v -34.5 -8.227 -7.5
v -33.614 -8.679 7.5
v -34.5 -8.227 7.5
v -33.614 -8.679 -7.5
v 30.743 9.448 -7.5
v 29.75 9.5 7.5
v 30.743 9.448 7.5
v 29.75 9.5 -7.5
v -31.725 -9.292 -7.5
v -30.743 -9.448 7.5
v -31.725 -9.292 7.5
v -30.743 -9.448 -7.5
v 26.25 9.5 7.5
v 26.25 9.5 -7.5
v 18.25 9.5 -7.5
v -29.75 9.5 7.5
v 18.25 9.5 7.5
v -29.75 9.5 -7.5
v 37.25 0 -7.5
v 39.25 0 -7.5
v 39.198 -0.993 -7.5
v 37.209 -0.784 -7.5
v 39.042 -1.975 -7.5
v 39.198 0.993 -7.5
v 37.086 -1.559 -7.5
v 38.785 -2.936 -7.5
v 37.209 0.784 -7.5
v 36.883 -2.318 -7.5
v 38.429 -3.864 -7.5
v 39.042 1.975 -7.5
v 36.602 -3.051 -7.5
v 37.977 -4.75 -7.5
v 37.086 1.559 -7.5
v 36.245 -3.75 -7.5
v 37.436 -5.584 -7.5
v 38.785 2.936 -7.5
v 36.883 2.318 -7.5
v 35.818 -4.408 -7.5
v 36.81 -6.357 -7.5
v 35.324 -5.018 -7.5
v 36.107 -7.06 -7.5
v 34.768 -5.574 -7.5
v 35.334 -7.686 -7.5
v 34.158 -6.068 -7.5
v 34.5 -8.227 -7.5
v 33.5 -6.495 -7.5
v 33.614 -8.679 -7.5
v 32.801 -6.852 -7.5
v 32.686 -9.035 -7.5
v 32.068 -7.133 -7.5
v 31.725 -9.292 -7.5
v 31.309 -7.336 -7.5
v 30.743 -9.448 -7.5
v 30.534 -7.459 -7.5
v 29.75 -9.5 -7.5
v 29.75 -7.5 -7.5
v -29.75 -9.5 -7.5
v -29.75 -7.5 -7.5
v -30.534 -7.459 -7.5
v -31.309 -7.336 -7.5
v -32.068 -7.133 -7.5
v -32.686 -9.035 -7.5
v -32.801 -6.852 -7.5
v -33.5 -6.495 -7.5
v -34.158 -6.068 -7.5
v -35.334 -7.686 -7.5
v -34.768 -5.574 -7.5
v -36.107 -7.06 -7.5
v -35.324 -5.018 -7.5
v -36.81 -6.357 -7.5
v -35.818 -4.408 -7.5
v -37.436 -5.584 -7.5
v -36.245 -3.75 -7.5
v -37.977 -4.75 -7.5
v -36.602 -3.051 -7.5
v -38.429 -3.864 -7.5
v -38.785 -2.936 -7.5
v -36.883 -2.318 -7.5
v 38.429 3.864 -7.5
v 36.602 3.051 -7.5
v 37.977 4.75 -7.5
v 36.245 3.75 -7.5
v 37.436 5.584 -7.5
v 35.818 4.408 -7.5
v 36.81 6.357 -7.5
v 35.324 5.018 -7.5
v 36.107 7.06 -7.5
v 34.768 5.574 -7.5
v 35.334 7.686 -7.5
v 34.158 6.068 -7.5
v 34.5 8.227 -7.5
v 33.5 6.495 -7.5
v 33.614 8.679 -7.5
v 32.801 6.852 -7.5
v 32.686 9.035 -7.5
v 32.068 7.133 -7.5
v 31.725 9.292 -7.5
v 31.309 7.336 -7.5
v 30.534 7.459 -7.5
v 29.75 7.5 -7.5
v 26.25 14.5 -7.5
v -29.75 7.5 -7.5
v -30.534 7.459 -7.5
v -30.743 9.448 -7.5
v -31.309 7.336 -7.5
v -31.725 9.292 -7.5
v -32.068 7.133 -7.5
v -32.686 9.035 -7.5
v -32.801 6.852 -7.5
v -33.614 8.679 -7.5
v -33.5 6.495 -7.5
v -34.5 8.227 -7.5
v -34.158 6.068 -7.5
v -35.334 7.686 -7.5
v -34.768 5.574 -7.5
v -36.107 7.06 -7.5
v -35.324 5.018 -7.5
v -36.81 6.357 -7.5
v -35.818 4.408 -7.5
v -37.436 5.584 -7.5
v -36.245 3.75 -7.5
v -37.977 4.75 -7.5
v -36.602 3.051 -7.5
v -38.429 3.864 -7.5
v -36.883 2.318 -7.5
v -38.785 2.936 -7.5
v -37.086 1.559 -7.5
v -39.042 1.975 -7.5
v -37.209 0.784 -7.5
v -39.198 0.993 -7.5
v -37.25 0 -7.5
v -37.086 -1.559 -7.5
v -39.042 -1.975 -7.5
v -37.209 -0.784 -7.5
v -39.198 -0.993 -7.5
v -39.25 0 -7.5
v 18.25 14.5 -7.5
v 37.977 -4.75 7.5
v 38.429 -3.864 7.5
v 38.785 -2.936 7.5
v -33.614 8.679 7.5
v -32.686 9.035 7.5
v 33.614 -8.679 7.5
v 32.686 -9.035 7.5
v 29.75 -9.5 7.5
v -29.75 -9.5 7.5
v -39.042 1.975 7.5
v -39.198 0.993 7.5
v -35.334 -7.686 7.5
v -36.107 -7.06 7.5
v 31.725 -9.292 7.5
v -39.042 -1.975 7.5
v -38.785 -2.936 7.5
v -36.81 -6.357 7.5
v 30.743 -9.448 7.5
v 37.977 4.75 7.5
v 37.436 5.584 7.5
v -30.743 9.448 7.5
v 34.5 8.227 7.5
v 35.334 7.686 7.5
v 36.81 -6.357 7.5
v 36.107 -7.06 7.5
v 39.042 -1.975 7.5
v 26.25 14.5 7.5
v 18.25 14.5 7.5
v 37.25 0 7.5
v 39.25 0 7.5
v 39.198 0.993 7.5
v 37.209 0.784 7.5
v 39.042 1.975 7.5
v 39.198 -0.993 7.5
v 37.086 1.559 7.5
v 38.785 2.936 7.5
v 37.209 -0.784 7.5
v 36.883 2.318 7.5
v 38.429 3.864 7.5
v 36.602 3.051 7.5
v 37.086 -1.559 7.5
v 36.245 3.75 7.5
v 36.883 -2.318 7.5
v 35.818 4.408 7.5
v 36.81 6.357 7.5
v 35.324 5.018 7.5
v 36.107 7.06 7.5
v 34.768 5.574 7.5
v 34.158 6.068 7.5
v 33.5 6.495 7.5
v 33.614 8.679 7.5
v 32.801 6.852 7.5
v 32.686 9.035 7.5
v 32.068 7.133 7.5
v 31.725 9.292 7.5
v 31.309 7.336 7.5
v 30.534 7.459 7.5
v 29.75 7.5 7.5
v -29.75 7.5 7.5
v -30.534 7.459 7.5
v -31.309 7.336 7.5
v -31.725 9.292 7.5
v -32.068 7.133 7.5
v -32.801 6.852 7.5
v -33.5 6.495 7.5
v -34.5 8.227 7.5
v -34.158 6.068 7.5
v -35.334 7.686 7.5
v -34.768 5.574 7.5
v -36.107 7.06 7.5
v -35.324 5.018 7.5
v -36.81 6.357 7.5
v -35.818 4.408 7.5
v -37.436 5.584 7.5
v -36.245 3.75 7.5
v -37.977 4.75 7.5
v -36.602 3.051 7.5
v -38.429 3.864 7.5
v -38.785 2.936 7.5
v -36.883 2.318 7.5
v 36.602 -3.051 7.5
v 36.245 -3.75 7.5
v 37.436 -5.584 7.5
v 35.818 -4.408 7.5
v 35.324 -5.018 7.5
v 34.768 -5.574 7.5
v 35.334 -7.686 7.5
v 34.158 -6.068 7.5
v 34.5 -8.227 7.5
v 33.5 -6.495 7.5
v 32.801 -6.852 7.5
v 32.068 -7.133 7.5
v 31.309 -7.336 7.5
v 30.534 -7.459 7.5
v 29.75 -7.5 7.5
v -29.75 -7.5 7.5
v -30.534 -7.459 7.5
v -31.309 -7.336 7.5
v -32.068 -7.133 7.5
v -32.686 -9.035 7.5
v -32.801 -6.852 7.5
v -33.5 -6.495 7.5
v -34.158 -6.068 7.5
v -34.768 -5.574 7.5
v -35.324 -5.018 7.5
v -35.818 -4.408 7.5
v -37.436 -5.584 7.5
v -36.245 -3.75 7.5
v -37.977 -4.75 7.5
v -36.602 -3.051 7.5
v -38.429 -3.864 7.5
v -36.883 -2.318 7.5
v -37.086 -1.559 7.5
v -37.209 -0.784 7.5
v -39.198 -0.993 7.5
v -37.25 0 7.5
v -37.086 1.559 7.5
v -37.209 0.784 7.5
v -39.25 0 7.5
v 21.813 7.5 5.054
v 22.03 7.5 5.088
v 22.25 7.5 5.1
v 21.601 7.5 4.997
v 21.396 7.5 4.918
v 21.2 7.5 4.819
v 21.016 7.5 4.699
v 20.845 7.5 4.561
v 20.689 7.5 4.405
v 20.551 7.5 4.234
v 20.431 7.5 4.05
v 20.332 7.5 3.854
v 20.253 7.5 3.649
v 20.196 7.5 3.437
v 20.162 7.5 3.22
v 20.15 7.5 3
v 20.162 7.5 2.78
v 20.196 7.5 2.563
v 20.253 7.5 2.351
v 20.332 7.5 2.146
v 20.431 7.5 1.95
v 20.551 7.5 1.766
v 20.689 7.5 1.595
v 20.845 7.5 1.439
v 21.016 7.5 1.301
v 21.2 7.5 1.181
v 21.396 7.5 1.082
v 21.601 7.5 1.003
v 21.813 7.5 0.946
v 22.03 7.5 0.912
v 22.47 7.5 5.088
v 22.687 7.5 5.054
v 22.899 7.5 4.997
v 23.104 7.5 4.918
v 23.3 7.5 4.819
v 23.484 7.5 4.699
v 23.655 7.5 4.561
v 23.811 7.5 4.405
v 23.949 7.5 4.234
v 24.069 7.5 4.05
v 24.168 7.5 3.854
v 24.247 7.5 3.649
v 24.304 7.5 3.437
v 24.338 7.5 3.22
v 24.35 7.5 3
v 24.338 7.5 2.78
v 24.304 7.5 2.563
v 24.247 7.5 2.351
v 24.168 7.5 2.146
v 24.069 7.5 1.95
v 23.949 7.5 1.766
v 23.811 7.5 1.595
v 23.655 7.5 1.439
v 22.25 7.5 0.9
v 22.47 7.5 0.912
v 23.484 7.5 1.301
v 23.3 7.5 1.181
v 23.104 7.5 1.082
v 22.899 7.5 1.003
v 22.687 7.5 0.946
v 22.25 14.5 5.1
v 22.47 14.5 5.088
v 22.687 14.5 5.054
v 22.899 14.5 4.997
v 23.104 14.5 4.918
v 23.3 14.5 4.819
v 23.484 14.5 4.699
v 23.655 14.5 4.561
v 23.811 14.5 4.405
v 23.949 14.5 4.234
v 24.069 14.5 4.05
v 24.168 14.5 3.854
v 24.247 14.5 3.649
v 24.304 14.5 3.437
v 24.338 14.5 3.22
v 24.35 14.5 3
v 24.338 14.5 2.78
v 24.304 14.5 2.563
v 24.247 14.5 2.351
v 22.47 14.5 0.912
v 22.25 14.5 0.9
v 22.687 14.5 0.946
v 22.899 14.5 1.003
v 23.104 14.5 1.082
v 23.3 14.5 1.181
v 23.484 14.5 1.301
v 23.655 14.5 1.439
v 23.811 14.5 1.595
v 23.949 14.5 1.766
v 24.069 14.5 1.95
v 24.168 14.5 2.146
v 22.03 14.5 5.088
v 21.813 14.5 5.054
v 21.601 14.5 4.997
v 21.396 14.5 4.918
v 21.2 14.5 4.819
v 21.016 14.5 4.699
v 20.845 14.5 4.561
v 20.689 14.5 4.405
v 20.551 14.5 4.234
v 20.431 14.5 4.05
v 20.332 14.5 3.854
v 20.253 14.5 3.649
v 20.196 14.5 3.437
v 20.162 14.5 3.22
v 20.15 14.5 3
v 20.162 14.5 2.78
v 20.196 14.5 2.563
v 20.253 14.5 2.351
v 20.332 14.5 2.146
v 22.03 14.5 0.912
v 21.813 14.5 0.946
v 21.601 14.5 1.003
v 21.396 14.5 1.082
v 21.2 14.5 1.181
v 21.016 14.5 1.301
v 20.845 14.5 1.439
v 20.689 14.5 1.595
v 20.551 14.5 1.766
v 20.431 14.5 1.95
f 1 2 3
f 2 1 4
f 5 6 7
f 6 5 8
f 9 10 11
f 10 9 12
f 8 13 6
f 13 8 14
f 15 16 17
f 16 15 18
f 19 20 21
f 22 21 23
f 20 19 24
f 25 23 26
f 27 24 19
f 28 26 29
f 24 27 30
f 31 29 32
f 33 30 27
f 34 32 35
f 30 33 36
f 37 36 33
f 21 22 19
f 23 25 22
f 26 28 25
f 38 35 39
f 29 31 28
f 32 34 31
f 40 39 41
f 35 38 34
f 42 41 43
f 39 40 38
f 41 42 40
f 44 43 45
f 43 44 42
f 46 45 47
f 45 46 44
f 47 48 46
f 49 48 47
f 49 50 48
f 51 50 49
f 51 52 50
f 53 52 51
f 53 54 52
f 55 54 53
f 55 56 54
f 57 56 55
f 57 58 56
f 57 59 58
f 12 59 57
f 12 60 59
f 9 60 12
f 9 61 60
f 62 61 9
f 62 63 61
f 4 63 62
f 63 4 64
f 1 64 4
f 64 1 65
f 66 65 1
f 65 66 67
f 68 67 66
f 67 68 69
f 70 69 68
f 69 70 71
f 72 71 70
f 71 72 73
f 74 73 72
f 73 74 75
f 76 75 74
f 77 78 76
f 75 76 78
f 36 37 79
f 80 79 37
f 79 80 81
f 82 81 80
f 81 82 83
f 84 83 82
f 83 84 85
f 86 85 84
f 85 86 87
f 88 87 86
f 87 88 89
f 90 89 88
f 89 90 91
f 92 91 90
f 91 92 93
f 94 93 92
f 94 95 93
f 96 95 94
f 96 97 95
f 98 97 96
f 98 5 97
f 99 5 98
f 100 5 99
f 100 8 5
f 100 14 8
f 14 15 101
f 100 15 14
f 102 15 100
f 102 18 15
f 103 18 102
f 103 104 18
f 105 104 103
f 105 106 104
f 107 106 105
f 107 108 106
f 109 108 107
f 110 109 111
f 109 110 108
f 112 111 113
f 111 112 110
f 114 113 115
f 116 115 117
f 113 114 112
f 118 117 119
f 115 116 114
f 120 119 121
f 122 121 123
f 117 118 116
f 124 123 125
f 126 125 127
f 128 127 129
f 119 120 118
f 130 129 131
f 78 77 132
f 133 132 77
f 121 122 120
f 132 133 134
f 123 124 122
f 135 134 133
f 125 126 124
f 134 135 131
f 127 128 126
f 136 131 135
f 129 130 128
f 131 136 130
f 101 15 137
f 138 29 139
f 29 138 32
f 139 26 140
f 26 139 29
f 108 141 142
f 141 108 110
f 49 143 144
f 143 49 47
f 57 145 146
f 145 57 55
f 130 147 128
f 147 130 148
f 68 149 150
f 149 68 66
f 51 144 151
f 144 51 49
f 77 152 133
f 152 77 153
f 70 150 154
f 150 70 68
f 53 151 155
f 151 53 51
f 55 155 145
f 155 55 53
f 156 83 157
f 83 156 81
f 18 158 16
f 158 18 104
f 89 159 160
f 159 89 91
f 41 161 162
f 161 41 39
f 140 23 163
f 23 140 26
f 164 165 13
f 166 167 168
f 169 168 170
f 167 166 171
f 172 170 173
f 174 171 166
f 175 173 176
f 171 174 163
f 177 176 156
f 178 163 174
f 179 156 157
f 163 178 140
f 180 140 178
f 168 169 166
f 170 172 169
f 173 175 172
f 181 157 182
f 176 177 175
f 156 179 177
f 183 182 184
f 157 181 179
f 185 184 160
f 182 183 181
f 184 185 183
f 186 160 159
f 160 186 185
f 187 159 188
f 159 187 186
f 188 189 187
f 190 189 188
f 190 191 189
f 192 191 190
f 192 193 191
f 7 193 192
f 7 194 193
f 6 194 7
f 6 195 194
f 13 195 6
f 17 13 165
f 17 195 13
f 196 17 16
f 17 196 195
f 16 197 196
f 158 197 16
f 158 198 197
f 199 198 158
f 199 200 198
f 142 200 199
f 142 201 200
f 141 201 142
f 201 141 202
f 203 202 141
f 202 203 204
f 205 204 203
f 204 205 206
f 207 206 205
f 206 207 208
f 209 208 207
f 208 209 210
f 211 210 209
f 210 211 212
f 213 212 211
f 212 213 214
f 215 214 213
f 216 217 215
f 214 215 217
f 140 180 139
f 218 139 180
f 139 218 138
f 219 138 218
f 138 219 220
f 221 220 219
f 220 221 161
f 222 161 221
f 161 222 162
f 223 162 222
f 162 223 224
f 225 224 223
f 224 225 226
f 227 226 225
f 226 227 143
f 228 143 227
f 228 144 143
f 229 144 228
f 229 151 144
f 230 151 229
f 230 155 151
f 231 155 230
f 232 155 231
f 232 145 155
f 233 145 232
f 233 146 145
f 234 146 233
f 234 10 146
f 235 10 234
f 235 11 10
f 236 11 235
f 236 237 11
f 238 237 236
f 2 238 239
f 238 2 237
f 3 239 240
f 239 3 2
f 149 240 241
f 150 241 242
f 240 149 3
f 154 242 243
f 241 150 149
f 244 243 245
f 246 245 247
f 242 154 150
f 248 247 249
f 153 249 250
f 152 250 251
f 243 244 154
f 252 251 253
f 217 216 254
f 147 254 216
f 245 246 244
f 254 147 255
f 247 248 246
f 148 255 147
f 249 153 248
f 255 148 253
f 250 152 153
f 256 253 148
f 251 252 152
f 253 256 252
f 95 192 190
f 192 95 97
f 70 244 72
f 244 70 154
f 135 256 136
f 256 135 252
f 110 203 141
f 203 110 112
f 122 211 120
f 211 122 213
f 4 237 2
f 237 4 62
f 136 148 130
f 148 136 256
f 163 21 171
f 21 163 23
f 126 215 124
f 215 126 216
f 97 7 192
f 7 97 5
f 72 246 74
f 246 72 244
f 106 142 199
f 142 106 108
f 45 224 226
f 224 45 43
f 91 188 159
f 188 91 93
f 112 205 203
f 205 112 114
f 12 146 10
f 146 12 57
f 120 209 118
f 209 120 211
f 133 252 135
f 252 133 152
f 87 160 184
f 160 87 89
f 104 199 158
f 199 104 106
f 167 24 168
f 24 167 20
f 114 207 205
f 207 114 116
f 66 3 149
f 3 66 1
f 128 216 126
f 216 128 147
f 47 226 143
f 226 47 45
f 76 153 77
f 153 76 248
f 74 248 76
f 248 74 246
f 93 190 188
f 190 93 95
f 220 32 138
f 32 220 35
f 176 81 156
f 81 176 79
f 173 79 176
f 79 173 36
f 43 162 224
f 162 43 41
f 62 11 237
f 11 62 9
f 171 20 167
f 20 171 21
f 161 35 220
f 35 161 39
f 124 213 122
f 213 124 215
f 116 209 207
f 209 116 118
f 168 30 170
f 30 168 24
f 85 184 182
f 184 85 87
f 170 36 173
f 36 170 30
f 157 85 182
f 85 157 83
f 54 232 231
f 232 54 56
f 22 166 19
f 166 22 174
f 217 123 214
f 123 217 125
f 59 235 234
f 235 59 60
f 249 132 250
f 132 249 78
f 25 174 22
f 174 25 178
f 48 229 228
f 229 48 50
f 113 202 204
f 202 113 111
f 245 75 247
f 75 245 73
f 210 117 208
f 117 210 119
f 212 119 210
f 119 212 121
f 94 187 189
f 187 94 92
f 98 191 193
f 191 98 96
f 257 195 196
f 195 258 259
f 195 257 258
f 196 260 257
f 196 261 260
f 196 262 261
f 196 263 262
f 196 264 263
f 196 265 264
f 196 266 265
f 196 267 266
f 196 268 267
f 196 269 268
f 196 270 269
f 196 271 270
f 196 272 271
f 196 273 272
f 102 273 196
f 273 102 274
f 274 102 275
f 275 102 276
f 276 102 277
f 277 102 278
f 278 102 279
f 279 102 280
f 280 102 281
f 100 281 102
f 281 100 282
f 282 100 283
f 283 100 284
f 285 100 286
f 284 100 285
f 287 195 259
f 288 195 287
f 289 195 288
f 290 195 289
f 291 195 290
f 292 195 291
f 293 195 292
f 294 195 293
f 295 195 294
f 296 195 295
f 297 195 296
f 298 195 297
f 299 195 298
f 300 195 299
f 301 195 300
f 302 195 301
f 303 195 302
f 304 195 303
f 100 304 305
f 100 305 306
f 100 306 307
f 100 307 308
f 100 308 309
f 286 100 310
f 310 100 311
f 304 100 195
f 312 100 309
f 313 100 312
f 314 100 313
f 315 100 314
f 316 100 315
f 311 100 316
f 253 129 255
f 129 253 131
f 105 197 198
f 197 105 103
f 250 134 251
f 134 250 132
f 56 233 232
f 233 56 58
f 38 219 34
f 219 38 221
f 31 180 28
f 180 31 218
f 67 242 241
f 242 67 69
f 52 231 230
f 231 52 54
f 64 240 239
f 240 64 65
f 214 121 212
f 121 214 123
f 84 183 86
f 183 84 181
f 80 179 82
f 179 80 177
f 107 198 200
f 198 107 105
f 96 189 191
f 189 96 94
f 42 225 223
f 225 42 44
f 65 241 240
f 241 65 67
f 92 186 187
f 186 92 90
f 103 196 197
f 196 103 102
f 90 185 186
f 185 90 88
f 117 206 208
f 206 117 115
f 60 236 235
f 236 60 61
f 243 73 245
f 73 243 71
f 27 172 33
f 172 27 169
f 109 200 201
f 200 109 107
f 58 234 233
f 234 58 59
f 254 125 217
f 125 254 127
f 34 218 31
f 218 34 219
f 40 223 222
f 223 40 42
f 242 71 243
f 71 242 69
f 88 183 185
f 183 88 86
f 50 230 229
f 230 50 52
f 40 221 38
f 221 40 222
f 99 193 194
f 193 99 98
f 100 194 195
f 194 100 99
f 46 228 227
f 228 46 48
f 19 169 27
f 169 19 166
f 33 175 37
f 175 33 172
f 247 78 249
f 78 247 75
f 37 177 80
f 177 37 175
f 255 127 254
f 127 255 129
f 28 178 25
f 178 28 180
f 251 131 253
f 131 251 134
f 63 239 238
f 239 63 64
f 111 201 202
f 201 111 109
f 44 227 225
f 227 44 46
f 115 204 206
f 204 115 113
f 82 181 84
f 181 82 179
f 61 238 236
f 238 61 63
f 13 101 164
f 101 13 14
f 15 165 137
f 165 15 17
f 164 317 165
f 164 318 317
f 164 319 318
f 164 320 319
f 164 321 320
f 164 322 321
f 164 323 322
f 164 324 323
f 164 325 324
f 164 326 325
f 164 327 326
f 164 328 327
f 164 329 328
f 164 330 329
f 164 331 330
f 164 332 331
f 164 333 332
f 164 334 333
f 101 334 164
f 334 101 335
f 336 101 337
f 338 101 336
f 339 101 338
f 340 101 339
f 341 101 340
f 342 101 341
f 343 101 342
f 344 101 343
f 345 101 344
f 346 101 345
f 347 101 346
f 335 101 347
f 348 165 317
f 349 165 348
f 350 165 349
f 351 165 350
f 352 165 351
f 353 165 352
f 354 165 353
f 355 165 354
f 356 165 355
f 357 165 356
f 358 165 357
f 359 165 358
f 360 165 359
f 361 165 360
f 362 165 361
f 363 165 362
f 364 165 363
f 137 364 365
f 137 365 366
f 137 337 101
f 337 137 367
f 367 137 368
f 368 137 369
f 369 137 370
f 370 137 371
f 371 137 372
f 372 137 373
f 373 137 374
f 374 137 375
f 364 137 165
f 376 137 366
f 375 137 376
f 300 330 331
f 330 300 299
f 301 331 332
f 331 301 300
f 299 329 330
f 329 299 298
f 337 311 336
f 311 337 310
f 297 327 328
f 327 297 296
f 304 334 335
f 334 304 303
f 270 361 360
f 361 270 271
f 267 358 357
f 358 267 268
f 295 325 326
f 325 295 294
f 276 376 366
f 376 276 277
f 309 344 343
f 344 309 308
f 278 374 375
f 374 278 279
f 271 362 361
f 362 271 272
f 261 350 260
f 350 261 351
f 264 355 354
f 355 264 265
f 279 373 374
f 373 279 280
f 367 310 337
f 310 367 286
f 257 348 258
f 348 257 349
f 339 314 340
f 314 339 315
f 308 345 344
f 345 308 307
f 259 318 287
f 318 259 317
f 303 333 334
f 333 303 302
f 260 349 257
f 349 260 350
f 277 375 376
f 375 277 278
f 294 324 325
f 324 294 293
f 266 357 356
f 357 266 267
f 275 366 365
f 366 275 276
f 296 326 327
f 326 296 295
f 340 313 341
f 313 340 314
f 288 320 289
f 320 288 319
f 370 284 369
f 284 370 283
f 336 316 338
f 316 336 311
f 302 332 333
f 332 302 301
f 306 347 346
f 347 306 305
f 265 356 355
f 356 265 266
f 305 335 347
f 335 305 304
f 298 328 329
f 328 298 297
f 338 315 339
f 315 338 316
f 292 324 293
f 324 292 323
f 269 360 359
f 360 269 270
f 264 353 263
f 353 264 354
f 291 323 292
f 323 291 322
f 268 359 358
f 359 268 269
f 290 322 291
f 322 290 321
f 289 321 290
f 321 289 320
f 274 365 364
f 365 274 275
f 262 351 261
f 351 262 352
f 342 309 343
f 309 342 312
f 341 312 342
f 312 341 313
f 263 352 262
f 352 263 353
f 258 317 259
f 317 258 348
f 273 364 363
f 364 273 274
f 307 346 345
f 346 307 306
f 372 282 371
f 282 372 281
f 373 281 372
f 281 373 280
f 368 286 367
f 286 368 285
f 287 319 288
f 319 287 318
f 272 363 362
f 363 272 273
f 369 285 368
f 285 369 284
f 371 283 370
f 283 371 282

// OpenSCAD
$fn=60;

RAD = 15/2;
MAIN_LEN = 115;
TOT_WIDTH = 74.5;
RING_HT=15;
RING_TN = 2;
SCREW_BLOCK_WD = 8;

ARM_THICKNESS = 5;
cyl_offset = (TOT_WIDTH - (2*RAD) )/2;

module holding_ring(ring_ht){
    

    

    difference(){
        hull(){
            translate([cyl_offset,0,0]){
                cylinder(ring_ht,RAD+RING_TN,RAD+RING_TN,center=true);
            }
            translate([-cyl_offset,0,0]){
                cylinder(ring_ht,RAD+RING_TN,RAD+RING_TN,center=true);
            }

        }

        hull(){
            translate([cyl_offset,0,0]){
                cylinder(MAIN_LEN,RAD,RAD,center=true);
            }
            translate([-cyl_offset,0,0]){
                cylinder(MAIN_LEN,RAD,RAD,center=true);
            }

        }
        
    }
}

difference(){
    union(){
        holding_ring(RING_HT);
        translate([cyl_offset-RAD,RAD+(SCREW_BLOCK_WD/2),0]){
            cube([SCREW_BLOCK_WD,SCREW_BLOCK_WD-2,RING_HT],center=true);
        }
    }
    #translate([cyl_offset-RAD,RAD+(SCREW_BLOCK_WD/2),3]){
        rotate(90,[1,0,0]){
            cylinder(h=8,r=4.2/2,center=true);
        }
    }
}
